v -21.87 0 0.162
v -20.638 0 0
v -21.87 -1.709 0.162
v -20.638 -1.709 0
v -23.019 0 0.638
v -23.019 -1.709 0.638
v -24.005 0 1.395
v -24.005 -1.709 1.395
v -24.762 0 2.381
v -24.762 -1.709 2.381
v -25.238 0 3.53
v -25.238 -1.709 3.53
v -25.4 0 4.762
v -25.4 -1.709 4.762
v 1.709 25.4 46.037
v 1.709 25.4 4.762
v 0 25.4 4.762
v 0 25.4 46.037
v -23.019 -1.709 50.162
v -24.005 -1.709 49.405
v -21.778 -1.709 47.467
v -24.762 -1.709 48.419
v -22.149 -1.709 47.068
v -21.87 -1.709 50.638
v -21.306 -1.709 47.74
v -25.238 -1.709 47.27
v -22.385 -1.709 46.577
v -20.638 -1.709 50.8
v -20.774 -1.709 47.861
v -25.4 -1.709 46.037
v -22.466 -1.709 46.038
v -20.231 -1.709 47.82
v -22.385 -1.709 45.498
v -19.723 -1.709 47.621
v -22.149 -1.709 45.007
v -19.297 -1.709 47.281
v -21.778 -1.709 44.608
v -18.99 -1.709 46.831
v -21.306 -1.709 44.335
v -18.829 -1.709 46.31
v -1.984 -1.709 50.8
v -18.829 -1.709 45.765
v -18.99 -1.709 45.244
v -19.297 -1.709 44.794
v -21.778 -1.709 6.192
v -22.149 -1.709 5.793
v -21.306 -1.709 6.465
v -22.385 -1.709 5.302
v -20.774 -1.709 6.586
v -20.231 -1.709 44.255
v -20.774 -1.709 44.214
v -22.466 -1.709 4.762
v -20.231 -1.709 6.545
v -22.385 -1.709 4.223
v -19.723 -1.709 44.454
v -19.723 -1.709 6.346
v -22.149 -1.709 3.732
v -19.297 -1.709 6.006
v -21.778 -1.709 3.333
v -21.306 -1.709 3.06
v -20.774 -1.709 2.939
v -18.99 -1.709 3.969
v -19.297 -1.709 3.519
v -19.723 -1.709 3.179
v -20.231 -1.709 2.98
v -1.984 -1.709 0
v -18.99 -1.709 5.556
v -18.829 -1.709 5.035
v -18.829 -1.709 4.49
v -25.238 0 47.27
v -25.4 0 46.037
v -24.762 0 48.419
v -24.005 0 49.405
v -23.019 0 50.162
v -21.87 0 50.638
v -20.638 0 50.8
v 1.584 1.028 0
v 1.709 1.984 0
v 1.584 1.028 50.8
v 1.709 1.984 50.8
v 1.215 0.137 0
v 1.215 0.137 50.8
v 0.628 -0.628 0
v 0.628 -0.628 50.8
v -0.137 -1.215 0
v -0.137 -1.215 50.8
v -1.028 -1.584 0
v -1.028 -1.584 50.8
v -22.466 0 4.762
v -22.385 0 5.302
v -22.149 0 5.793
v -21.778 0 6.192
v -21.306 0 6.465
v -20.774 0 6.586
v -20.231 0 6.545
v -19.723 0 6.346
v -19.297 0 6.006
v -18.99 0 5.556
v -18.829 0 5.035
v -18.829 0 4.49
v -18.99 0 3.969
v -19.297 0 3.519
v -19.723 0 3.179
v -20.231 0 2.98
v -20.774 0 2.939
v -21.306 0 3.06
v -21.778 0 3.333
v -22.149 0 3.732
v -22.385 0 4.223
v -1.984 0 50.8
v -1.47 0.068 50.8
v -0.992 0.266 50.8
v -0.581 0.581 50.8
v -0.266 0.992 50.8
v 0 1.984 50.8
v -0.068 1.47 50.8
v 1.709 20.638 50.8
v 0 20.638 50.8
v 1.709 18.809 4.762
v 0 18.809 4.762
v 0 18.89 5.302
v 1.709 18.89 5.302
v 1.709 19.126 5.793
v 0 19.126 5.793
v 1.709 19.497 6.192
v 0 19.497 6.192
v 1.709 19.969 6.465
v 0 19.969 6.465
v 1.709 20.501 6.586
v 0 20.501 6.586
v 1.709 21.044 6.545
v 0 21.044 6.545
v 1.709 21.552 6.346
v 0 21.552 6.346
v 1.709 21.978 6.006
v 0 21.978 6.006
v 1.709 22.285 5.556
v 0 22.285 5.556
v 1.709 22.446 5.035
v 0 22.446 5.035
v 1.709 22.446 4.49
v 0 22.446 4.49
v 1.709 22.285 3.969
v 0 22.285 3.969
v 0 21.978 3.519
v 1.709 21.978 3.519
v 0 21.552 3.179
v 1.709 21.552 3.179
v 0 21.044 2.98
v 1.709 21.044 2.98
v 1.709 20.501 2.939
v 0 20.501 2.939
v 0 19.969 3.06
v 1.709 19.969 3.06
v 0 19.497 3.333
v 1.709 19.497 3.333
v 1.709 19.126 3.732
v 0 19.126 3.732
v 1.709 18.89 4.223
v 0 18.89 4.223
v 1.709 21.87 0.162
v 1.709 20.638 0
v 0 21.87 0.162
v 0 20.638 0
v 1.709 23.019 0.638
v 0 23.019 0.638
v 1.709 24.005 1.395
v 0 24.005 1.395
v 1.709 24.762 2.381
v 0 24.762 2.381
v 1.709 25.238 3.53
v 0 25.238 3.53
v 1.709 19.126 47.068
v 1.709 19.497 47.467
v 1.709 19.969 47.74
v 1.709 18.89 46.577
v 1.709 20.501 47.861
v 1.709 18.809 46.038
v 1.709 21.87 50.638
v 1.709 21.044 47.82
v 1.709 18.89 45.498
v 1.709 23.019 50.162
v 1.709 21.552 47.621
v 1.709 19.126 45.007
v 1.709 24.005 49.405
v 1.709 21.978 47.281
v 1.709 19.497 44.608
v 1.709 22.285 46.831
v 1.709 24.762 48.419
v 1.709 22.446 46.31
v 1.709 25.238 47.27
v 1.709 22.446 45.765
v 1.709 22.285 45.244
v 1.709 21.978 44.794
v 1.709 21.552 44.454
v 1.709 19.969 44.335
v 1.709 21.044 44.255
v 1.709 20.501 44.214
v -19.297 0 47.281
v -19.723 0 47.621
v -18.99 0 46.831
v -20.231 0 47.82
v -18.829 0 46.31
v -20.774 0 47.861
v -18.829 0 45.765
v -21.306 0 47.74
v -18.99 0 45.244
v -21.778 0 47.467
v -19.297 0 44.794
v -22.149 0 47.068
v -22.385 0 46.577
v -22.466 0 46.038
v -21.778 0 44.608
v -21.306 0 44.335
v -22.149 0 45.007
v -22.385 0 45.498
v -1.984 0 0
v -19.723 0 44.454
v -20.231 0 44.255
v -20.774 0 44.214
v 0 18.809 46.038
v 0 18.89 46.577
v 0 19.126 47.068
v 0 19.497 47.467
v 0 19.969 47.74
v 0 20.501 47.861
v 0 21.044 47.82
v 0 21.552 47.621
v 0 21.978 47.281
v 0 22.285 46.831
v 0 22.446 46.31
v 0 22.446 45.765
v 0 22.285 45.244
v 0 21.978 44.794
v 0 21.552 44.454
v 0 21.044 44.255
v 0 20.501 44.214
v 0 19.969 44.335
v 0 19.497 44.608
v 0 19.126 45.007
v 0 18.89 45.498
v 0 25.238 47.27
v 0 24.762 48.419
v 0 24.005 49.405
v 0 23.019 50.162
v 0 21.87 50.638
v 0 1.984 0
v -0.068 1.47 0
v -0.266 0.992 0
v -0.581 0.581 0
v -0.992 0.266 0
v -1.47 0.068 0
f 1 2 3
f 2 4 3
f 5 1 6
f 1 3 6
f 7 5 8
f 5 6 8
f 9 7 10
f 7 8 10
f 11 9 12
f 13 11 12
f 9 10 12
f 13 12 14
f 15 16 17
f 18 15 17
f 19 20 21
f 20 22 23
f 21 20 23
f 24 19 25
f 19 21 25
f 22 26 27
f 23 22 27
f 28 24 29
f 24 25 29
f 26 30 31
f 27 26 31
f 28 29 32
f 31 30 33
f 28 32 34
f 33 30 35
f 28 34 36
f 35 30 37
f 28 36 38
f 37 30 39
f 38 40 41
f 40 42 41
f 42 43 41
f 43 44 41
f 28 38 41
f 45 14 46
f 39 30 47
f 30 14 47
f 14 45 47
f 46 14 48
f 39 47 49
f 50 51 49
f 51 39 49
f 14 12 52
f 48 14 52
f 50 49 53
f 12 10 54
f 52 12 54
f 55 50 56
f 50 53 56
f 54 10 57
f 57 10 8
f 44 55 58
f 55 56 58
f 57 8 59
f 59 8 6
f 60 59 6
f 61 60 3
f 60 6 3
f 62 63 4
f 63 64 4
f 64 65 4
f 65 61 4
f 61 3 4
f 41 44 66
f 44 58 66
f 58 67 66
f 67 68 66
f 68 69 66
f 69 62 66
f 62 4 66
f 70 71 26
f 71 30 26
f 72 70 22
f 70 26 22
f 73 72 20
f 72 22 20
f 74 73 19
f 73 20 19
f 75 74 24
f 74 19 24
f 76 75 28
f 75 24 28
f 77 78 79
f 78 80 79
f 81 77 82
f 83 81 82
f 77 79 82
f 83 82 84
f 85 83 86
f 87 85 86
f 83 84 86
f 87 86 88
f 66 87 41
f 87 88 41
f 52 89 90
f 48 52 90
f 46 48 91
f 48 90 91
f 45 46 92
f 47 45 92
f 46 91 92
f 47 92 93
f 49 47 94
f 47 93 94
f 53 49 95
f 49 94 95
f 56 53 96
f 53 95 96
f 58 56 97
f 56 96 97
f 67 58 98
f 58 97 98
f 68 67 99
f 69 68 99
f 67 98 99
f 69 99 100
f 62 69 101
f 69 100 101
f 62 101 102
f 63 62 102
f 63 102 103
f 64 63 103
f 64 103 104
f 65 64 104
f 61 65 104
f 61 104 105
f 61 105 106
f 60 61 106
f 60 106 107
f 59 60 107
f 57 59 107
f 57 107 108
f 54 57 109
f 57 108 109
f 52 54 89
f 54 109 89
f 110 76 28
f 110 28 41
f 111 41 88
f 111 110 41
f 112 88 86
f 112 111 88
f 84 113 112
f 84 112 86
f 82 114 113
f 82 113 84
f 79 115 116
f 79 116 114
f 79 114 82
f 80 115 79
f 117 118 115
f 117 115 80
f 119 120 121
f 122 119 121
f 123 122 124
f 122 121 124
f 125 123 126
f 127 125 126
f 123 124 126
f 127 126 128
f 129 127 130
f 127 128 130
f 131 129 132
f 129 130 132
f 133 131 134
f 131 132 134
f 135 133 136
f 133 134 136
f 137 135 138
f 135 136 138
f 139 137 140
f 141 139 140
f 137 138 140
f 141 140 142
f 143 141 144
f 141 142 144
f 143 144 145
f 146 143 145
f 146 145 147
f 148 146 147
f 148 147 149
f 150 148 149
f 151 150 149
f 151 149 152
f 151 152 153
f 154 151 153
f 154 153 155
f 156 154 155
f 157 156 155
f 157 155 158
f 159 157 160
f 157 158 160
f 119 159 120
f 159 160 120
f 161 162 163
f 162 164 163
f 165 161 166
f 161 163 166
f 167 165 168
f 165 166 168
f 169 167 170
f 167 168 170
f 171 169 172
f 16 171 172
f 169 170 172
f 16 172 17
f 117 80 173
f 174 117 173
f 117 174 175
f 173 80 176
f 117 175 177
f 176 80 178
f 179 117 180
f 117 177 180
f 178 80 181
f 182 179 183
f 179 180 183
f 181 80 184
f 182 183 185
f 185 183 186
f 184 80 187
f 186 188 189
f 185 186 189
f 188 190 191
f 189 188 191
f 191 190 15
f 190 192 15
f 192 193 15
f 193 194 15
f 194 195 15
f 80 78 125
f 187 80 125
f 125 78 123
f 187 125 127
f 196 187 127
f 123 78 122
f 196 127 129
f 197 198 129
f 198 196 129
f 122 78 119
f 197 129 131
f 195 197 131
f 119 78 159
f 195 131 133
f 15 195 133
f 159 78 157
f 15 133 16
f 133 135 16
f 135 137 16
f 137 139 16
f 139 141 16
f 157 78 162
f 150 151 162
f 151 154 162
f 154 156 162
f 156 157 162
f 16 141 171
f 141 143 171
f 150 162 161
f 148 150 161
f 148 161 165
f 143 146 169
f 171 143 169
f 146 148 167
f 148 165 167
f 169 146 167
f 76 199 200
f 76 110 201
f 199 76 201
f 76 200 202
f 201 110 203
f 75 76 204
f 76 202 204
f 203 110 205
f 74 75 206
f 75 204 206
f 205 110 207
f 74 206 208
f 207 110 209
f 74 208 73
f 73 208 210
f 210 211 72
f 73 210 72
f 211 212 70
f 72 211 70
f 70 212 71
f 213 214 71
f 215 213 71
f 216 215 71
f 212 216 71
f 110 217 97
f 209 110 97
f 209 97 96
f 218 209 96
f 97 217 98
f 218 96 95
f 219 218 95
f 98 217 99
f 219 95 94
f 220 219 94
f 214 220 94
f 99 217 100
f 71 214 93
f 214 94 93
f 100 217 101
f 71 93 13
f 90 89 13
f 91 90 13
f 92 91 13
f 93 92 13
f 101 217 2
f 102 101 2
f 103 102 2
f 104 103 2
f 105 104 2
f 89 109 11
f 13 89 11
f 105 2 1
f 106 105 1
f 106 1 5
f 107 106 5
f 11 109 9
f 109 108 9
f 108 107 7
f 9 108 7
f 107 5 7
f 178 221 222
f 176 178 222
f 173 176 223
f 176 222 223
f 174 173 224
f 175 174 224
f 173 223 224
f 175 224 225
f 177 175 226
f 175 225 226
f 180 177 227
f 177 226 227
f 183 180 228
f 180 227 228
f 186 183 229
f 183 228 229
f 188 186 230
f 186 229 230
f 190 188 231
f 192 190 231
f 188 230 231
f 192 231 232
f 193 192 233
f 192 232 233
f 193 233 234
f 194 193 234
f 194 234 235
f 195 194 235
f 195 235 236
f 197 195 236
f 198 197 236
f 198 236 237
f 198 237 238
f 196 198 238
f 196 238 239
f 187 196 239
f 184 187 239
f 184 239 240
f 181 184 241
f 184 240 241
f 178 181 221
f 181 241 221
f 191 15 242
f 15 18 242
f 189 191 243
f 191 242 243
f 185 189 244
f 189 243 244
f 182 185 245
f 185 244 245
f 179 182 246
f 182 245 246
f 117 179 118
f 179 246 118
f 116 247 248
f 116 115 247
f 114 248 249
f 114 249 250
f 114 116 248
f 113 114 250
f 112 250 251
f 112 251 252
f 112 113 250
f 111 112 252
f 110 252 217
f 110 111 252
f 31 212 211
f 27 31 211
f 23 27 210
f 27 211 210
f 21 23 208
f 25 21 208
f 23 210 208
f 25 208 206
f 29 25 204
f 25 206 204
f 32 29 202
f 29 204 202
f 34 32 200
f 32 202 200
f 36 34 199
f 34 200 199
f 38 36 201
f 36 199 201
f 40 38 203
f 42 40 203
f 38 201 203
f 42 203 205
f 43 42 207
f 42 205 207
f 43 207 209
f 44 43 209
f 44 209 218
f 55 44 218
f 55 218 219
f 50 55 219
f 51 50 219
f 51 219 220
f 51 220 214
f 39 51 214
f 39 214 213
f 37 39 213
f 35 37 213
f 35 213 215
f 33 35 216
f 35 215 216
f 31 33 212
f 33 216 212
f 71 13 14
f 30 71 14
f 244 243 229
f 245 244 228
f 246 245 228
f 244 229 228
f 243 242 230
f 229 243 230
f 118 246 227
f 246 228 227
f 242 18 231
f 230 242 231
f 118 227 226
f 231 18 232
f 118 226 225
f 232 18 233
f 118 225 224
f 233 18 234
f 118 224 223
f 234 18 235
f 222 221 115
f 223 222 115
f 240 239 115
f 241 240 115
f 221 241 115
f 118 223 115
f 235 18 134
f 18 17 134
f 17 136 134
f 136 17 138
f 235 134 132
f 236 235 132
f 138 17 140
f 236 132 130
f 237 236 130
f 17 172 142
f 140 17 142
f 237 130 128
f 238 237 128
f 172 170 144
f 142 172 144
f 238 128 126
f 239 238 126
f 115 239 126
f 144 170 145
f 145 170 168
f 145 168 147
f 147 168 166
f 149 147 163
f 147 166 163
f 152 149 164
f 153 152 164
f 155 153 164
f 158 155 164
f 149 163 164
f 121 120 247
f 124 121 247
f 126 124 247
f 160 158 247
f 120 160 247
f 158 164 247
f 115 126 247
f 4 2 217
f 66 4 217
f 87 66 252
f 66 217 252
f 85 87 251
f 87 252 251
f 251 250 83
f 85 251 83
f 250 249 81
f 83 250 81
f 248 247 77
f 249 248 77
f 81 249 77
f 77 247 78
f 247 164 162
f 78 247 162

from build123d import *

# Parameters (mm, degrees)
F1_DEPTH = 50.8
F2_R     = 1.98374
F3_R     = 3.69316
F4_R     = 1.8288
F5_DEPTH = 1.70942
F6_R     = 1.8288
F7_DEPTH = 1.70942
F8_R     = 4.7625


with BuildPart() as f1:
    # F0 (on Top) → F1 (new body)
    with BuildSketch(Plane.XY):
        Polygon((1.70942, 25.4), (0, 25.4), (0, 0), (-25.4, 0), (-25.4, -1.70942), (1.70942, -1.70942), align=None)
    extrude(amount=F1_DEPTH)

    # F2
    f2_edges = [f1.edges().sort_by_distance(p)[0] for p in [
        (0, 0, 25.4),
    ]]
    fillet(f2_edges, radius=F2_R)

    # F3
    f3_edges = [f1.edges().sort_by_distance(p)[0] for p in [
        (1.70942, -1.70942, 25.4),
    ]]
    fillet(f3_edges, radius=F3_R)

    # F4 (on face) → F5 (cut, through all)
    with BuildSketch(Plane(origin=(0, 0, 0), x_dir=(0, -1, 0), z_dir=(-1, 0, 0))):
        with Locations((-20.6375, 46.0375)):
            Circle(F4_R)
        with Locations((-20.6375, 4.7625)):
            Circle(F4_R)
    extrude(amount=-F5_DEPTH, mode=Mode.SUBTRACT)

    # F6 (on face) → F7 (cut, through all)
    with BuildSketch(Plane(origin=(0, 0, 0), x_dir=(-1, 0, 0), z_dir=(0, 1, 0))):
        with Locations((20.6375, 46.0375)):
            Circle(F6_R)
        with Locations((20.6375, 4.7625)):
            Circle(F6_R)
    extrude(amount=-F7_DEPTH, mode=Mode.SUBTRACT)

    # F8
    f8_edges = [f1.edges().sort_by_distance(p)[0] for p in [
        (0.85471, 25.4, 50.8),
        (-25.4, -0.85471, 50.8),
        (-25.4, -0.85471, 0),
        (0.85471, 25.4, 0),
    ]]
    fillet(f8_edges, radius=F8_R)


solid = f1.part
